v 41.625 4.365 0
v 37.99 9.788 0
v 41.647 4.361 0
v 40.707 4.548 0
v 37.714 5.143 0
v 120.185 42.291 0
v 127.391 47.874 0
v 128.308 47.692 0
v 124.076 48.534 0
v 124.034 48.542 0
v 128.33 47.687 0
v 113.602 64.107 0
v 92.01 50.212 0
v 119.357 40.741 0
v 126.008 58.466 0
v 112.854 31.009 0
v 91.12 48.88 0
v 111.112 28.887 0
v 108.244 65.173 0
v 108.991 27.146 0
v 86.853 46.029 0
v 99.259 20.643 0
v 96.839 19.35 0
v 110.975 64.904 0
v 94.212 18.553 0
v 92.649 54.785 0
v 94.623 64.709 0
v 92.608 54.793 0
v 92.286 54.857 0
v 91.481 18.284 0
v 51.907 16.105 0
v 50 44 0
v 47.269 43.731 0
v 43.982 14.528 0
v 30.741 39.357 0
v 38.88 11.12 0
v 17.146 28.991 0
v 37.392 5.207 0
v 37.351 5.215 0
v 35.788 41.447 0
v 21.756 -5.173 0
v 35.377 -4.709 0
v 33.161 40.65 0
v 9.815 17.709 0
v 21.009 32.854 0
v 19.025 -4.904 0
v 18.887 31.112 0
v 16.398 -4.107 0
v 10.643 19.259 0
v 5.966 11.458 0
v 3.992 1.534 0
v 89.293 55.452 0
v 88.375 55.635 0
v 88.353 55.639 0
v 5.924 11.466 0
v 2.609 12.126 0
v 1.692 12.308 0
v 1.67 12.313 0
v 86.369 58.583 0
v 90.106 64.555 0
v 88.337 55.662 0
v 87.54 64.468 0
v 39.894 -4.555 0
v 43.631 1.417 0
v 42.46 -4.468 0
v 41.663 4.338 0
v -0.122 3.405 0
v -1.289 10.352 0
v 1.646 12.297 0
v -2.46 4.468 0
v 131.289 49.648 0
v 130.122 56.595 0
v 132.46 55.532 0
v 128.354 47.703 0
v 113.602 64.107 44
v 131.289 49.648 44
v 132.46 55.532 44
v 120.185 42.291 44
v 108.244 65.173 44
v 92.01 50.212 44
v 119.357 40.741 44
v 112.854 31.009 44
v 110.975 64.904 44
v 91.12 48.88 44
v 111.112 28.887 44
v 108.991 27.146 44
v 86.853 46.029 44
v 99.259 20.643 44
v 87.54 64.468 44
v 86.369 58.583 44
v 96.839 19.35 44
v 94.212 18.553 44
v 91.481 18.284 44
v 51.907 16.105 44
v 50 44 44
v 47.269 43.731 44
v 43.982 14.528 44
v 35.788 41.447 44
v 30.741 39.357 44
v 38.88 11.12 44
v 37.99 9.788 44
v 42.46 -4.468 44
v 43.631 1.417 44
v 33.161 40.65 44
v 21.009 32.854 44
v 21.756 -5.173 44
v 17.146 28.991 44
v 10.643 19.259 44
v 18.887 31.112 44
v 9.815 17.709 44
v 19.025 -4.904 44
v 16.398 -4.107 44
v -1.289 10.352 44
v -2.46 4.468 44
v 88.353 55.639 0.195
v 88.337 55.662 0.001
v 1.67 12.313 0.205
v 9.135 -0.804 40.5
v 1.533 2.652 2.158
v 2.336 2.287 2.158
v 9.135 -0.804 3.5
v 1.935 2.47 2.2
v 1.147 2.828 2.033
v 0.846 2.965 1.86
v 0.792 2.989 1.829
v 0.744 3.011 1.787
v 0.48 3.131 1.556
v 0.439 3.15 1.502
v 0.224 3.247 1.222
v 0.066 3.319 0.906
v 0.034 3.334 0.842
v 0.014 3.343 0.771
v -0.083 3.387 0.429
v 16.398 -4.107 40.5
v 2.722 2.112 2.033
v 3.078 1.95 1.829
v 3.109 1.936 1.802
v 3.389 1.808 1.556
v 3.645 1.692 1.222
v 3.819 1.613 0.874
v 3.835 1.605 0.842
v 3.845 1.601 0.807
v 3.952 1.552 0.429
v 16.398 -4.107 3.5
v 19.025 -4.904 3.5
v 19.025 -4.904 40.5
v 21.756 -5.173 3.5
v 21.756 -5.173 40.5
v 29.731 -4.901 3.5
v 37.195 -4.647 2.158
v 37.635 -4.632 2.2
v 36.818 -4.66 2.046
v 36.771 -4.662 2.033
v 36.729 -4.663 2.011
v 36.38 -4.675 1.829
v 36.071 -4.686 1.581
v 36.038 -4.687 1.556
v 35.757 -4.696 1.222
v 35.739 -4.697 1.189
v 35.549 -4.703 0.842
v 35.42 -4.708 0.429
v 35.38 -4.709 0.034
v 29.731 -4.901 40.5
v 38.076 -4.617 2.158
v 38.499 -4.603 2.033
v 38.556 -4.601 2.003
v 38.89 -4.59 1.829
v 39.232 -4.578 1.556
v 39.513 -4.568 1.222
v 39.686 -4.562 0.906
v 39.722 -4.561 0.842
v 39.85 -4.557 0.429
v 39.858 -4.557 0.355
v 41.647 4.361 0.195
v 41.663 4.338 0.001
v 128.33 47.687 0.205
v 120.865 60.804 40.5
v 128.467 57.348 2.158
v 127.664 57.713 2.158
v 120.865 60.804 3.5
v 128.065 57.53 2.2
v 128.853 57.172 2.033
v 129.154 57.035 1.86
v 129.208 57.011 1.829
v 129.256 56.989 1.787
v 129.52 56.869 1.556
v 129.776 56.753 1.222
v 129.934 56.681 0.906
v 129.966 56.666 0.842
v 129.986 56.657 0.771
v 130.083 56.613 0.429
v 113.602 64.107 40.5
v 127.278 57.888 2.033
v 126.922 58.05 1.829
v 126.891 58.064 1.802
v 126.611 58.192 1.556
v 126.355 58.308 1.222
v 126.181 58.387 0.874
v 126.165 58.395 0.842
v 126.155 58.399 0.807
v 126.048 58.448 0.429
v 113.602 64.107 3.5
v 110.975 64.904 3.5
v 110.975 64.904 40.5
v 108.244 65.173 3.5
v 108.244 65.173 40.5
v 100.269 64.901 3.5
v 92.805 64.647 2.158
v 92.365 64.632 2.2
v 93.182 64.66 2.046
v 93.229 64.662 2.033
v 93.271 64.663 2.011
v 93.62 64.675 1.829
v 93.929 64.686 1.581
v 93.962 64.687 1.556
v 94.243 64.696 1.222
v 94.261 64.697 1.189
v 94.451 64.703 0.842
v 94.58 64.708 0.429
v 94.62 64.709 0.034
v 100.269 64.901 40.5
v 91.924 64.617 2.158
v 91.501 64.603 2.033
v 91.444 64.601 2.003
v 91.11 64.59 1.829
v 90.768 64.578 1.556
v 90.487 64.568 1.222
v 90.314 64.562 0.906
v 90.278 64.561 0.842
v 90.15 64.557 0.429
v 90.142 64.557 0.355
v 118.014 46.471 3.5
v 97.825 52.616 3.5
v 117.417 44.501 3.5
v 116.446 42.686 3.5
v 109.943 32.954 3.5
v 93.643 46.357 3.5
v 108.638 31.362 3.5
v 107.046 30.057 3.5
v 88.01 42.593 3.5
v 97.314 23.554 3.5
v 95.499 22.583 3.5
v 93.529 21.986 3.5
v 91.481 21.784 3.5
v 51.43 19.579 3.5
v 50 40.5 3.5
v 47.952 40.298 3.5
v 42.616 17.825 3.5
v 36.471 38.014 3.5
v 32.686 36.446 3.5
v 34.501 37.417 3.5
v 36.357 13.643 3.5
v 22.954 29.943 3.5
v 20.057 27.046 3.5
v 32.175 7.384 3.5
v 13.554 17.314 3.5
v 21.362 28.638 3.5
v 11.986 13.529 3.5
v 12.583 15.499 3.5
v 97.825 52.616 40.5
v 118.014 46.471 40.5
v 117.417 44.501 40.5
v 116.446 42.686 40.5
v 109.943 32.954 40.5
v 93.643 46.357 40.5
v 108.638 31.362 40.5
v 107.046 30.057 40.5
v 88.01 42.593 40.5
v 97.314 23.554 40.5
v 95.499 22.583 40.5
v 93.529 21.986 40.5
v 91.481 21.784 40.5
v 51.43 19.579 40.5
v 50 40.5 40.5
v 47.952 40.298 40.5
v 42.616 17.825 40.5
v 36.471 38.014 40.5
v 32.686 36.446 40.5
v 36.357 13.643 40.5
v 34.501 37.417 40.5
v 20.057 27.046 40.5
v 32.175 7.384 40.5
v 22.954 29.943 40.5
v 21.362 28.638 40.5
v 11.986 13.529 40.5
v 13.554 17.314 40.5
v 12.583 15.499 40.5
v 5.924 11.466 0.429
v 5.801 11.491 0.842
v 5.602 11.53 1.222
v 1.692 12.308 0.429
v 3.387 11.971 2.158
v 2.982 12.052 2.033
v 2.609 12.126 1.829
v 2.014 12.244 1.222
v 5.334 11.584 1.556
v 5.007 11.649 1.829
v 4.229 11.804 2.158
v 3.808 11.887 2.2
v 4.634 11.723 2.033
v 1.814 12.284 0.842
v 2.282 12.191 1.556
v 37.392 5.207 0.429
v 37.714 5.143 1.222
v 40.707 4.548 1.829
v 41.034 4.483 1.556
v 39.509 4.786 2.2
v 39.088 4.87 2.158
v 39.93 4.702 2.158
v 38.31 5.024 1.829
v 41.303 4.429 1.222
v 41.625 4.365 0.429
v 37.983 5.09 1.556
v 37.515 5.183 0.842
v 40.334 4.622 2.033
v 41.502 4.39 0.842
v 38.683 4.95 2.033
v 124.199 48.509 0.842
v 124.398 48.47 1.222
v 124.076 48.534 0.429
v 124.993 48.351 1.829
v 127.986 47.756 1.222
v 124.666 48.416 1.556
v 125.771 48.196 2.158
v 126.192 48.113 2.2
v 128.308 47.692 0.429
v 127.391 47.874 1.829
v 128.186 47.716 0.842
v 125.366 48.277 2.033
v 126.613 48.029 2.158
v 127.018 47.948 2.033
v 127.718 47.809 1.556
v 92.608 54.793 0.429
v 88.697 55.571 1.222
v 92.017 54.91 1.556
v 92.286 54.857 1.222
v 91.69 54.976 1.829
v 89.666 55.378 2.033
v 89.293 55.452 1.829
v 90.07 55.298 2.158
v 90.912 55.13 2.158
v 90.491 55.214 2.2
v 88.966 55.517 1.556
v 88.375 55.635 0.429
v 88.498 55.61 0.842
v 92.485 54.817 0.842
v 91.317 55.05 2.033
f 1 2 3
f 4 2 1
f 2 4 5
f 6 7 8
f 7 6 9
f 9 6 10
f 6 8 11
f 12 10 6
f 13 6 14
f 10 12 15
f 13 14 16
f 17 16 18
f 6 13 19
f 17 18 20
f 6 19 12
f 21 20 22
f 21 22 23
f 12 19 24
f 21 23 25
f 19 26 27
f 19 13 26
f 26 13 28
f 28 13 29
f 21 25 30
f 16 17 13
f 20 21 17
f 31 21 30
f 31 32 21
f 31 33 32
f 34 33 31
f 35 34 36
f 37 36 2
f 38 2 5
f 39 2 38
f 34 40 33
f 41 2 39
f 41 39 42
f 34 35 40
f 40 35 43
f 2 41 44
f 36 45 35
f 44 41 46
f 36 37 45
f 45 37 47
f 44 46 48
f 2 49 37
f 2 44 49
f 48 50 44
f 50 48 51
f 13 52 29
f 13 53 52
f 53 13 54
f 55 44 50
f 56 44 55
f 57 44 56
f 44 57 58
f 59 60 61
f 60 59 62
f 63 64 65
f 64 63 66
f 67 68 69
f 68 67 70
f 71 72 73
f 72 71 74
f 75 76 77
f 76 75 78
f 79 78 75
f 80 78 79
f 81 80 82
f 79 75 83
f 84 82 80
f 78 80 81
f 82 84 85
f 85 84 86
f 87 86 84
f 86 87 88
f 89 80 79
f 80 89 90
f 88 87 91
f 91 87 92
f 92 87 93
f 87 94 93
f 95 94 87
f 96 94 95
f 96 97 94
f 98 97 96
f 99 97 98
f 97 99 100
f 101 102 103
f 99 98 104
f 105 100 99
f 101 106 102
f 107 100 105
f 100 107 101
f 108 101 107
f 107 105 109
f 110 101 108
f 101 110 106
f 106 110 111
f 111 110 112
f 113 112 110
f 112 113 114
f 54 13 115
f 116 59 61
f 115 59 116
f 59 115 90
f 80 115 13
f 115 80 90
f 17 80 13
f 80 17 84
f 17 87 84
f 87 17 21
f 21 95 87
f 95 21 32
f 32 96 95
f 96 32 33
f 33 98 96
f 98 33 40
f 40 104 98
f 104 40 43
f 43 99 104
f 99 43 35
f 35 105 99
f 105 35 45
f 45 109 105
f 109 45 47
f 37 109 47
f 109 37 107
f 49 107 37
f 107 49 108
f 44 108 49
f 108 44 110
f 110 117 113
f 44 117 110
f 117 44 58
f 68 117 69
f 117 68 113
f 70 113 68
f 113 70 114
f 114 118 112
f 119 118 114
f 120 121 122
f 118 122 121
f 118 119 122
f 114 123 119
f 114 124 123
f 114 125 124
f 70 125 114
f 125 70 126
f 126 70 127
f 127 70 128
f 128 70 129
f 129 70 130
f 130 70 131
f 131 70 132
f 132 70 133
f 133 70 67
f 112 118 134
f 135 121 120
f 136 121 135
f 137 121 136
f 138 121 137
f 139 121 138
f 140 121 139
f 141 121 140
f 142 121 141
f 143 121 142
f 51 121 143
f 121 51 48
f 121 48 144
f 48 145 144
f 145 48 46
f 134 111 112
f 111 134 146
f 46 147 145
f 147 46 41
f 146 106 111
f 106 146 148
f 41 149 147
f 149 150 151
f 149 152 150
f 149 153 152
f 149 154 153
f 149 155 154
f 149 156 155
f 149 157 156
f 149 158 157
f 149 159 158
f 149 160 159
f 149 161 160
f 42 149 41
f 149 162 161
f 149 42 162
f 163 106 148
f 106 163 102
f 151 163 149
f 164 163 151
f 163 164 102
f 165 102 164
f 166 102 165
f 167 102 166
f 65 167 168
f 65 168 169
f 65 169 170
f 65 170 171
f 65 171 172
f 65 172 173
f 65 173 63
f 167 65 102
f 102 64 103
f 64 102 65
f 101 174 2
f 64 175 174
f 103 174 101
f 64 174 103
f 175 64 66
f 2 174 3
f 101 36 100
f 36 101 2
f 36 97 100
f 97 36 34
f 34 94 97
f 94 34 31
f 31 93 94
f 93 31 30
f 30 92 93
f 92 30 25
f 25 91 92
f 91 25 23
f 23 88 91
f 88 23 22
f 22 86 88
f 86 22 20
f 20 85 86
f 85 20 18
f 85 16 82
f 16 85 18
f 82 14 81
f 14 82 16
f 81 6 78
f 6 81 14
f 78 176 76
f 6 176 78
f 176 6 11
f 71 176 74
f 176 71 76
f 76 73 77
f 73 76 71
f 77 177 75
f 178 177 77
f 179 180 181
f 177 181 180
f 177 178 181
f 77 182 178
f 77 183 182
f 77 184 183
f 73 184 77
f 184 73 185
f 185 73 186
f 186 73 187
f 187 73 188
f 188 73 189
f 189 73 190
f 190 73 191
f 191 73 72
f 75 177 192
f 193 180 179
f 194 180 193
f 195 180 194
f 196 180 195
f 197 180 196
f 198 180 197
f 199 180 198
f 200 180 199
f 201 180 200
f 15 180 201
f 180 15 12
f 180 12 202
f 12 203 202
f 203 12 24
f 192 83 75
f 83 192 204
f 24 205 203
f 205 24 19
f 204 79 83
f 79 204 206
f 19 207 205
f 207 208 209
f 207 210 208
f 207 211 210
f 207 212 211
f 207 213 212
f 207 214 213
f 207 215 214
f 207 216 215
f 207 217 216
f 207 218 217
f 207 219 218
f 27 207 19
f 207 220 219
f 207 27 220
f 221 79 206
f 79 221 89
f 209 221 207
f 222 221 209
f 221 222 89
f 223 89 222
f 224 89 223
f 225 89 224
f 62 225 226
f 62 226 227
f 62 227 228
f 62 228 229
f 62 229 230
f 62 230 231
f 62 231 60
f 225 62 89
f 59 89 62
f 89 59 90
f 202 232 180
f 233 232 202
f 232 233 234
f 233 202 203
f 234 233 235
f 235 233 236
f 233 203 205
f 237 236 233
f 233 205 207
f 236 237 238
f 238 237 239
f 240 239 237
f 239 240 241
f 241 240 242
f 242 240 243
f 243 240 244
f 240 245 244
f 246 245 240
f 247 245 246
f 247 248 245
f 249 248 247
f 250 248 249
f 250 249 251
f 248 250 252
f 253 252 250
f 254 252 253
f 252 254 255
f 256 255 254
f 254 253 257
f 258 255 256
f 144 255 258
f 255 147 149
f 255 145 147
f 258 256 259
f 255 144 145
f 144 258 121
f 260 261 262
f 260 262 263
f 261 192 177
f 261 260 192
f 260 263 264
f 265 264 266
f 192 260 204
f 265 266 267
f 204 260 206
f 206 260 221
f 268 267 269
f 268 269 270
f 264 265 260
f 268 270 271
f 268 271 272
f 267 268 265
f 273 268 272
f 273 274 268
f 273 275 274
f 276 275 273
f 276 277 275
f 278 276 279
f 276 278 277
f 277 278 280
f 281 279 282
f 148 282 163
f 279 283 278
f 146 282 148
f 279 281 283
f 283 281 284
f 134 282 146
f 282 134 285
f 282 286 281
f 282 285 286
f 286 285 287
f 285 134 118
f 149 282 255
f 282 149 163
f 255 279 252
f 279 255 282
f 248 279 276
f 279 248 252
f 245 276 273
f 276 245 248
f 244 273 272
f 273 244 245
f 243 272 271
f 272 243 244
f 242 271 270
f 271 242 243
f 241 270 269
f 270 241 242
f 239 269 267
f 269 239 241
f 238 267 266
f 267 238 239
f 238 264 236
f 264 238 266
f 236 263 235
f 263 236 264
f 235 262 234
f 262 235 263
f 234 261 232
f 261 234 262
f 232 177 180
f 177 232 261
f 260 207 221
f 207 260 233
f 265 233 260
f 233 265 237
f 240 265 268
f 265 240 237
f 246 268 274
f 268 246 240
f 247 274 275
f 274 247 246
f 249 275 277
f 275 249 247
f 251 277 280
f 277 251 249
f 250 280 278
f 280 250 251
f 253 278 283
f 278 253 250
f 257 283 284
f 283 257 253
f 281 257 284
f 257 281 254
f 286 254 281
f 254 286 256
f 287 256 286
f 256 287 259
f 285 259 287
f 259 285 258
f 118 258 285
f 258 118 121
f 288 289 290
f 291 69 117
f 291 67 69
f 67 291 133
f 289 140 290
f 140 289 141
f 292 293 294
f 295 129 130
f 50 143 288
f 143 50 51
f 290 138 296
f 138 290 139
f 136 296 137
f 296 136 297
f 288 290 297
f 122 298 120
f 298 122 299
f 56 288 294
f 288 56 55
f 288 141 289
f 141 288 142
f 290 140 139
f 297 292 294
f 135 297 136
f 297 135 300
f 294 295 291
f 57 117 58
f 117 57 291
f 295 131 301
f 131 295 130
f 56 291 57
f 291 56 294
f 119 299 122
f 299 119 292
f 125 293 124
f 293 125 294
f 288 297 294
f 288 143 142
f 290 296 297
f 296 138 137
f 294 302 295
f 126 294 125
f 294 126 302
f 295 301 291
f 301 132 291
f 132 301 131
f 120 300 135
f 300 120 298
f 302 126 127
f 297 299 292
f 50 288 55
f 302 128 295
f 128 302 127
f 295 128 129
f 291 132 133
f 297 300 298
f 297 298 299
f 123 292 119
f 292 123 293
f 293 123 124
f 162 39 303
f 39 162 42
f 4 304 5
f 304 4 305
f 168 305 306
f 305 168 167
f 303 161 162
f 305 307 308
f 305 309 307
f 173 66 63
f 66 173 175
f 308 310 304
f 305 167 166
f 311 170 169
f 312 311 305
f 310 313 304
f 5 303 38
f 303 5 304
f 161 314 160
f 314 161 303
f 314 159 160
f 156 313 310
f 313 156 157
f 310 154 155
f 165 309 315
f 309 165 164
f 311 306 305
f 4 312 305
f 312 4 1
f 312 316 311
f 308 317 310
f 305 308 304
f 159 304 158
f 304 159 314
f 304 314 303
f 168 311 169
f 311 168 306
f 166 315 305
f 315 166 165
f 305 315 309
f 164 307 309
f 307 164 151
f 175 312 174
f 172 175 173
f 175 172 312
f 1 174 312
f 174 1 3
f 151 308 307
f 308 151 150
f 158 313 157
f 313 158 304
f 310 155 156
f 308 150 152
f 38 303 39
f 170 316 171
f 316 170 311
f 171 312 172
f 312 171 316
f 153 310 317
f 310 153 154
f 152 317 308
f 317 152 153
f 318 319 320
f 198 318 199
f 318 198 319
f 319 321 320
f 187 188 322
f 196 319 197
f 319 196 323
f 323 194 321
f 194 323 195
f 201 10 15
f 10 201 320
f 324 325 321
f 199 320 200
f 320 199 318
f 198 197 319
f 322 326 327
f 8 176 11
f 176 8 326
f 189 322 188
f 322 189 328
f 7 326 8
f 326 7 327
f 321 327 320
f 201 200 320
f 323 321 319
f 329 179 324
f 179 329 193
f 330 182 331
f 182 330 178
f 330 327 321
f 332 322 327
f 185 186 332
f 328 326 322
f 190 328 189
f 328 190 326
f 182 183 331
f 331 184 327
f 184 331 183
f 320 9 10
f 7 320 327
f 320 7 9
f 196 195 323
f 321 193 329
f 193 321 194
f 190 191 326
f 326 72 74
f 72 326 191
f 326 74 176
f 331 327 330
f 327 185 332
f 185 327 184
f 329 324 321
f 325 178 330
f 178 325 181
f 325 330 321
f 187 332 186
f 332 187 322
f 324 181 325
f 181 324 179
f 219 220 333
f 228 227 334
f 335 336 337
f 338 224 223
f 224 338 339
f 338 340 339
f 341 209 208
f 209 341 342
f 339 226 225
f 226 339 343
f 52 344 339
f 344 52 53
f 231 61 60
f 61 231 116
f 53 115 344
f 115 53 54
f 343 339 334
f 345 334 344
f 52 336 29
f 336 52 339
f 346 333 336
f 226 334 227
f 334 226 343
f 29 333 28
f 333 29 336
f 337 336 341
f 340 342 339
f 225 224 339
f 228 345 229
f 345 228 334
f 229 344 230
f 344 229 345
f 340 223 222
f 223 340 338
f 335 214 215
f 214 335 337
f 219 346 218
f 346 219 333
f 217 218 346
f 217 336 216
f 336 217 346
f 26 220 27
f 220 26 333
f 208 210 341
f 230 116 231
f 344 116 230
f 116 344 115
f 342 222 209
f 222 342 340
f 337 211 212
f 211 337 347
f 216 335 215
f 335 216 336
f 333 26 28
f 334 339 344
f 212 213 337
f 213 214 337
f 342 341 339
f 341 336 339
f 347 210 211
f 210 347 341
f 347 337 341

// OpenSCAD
$fn = 32;

// ----------------------------------------------------------------------
// Air duct: 28 mm duct, 3.5 mm wall, 44 mm across
// ----------------------------------------------------------------------

// --- parameters (mm) ---
duct_r = 14;              // duct core radius
duct_d = 28;              // duct core diameter
wall = 3.5;               // duct wall thickness
height = 44;              // duct width (extrusion height)
port_r = 22.9;            // port flange half width
port_d = 45.8;            // port flange width
port_t = 6;               // port flange thickness
bolt_d = 4.4;             // port bolt holes
bolt_offset = 18.2;       // bolt hole offset from the port axis

difference() {
  /* outer hull chain: tube with a flat flange plate at every port */
  linear_extrude(height = 44) {
    hull() {
      polygon([[42.46, -4.468], [-2.46, 4.468], [-1.289, 10.352], [43.631, 1.417]]);
      translate([21.756, 8.827]) circle(r = 14);
    }
    hull() {
      translate([21.756, 8.827]) circle(r = 14);
      translate([22.284, 11.481]) circle(r = 14);
    }
    hull() {
      translate([22.284, 11.481]) circle(r = 14);
      translate([28.787, 21.213]) circle(r = 14);
    }
    hull() {
      translate([28.787, 21.213]) circle(r = 14);
      translate([38.519, 27.716]) circle(r = 14);
    }
    hull() {
      translate([38.519, 27.716]) circle(r = 14);
      translate([50, 30]) circle(r = 14);
    }
    hull() {
      translate([50, 30]) circle(r = 14);
      translate([91.481, 32.284]) circle(r = 14);
    }
    hull() {
      translate([91.481, 32.284]) circle(r = 14);
      translate([101.213, 38.787]) circle(r = 14);
    }
    hull() {
      translate([101.213, 38.787]) circle(r = 14);
      translate([107.716, 48.519]) circle(r = 14);
    }
    hull() {
      translate([107.716, 48.519]) circle(r = 14);
      translate([108.244, 51.173]) circle(r = 14);
    }
    hull() {
      translate([108.244, 51.173]) circle(r = 14);
      polygon([[87.54, 64.468], [132.46, 55.532], [131.289, 49.648], [86.369, 58.583]]);
    }
  }
  /* air passage: the same chain inset by the wall, 5 mm proud of the ports */
  translate([0, 0, 3.5]) linear_extrude(height = 37) {
    hull() {
      translate([19.025, -4.904]) circle(r = 10.5);
      translate([22.284, 11.481]) circle(r = 10.5);
    }
    hull() {
      translate([22.284, 11.481]) circle(r = 10.5);
      translate([28.787, 21.213]) circle(r = 10.5);
    }
    hull() {
      translate([28.787, 21.213]) circle(r = 10.5);
      translate([38.519, 27.716]) circle(r = 10.5);
    }
    hull() {
      translate([38.519, 27.716]) circle(r = 10.5);
      translate([50, 30]) circle(r = 10.5);
    }
    hull() {
      translate([50, 30]) circle(r = 10.5);
      translate([91.481, 32.284]) circle(r = 10.5);
    }
    hull() {
      translate([91.481, 32.284]) circle(r = 10.5);
      translate([101.213, 38.787]) circle(r = 10.5);
    }
    hull() {
      translate([101.213, 38.787]) circle(r = 10.5);
      translate([107.716, 48.519]) circle(r = 10.5);
    }
    hull() {
      translate([107.716, 48.519]) circle(r = 10.5);
      translate([110.975, 64.904]) circle(r = 10.5);
    }
  }
  translate([20, 0]) rotate([0, 0, -11.25]) translate([-18.2, -2.5]) rotate([-90, 0, 0]) cylinder(h = 11, d = 4.4);
  translate([20, 0]) rotate([0, 0, -11.25]) translate([18.2, -2.5]) rotate([-90, 0, 0]) cylinder(h = 11, d = 4.4);
  translate([110, 60]) rotate([0, 0, 168.75]) translate([-18.2, -2.5]) rotate([-90, 0, 0]) cylinder(h = 11, d = 4.4);
  translate([110, 60]) rotate([0, 0, 168.75]) translate([18.2, -2.5]) rotate([-90, 0, 0]) cylinder(h = 11, d = 4.4);
}
